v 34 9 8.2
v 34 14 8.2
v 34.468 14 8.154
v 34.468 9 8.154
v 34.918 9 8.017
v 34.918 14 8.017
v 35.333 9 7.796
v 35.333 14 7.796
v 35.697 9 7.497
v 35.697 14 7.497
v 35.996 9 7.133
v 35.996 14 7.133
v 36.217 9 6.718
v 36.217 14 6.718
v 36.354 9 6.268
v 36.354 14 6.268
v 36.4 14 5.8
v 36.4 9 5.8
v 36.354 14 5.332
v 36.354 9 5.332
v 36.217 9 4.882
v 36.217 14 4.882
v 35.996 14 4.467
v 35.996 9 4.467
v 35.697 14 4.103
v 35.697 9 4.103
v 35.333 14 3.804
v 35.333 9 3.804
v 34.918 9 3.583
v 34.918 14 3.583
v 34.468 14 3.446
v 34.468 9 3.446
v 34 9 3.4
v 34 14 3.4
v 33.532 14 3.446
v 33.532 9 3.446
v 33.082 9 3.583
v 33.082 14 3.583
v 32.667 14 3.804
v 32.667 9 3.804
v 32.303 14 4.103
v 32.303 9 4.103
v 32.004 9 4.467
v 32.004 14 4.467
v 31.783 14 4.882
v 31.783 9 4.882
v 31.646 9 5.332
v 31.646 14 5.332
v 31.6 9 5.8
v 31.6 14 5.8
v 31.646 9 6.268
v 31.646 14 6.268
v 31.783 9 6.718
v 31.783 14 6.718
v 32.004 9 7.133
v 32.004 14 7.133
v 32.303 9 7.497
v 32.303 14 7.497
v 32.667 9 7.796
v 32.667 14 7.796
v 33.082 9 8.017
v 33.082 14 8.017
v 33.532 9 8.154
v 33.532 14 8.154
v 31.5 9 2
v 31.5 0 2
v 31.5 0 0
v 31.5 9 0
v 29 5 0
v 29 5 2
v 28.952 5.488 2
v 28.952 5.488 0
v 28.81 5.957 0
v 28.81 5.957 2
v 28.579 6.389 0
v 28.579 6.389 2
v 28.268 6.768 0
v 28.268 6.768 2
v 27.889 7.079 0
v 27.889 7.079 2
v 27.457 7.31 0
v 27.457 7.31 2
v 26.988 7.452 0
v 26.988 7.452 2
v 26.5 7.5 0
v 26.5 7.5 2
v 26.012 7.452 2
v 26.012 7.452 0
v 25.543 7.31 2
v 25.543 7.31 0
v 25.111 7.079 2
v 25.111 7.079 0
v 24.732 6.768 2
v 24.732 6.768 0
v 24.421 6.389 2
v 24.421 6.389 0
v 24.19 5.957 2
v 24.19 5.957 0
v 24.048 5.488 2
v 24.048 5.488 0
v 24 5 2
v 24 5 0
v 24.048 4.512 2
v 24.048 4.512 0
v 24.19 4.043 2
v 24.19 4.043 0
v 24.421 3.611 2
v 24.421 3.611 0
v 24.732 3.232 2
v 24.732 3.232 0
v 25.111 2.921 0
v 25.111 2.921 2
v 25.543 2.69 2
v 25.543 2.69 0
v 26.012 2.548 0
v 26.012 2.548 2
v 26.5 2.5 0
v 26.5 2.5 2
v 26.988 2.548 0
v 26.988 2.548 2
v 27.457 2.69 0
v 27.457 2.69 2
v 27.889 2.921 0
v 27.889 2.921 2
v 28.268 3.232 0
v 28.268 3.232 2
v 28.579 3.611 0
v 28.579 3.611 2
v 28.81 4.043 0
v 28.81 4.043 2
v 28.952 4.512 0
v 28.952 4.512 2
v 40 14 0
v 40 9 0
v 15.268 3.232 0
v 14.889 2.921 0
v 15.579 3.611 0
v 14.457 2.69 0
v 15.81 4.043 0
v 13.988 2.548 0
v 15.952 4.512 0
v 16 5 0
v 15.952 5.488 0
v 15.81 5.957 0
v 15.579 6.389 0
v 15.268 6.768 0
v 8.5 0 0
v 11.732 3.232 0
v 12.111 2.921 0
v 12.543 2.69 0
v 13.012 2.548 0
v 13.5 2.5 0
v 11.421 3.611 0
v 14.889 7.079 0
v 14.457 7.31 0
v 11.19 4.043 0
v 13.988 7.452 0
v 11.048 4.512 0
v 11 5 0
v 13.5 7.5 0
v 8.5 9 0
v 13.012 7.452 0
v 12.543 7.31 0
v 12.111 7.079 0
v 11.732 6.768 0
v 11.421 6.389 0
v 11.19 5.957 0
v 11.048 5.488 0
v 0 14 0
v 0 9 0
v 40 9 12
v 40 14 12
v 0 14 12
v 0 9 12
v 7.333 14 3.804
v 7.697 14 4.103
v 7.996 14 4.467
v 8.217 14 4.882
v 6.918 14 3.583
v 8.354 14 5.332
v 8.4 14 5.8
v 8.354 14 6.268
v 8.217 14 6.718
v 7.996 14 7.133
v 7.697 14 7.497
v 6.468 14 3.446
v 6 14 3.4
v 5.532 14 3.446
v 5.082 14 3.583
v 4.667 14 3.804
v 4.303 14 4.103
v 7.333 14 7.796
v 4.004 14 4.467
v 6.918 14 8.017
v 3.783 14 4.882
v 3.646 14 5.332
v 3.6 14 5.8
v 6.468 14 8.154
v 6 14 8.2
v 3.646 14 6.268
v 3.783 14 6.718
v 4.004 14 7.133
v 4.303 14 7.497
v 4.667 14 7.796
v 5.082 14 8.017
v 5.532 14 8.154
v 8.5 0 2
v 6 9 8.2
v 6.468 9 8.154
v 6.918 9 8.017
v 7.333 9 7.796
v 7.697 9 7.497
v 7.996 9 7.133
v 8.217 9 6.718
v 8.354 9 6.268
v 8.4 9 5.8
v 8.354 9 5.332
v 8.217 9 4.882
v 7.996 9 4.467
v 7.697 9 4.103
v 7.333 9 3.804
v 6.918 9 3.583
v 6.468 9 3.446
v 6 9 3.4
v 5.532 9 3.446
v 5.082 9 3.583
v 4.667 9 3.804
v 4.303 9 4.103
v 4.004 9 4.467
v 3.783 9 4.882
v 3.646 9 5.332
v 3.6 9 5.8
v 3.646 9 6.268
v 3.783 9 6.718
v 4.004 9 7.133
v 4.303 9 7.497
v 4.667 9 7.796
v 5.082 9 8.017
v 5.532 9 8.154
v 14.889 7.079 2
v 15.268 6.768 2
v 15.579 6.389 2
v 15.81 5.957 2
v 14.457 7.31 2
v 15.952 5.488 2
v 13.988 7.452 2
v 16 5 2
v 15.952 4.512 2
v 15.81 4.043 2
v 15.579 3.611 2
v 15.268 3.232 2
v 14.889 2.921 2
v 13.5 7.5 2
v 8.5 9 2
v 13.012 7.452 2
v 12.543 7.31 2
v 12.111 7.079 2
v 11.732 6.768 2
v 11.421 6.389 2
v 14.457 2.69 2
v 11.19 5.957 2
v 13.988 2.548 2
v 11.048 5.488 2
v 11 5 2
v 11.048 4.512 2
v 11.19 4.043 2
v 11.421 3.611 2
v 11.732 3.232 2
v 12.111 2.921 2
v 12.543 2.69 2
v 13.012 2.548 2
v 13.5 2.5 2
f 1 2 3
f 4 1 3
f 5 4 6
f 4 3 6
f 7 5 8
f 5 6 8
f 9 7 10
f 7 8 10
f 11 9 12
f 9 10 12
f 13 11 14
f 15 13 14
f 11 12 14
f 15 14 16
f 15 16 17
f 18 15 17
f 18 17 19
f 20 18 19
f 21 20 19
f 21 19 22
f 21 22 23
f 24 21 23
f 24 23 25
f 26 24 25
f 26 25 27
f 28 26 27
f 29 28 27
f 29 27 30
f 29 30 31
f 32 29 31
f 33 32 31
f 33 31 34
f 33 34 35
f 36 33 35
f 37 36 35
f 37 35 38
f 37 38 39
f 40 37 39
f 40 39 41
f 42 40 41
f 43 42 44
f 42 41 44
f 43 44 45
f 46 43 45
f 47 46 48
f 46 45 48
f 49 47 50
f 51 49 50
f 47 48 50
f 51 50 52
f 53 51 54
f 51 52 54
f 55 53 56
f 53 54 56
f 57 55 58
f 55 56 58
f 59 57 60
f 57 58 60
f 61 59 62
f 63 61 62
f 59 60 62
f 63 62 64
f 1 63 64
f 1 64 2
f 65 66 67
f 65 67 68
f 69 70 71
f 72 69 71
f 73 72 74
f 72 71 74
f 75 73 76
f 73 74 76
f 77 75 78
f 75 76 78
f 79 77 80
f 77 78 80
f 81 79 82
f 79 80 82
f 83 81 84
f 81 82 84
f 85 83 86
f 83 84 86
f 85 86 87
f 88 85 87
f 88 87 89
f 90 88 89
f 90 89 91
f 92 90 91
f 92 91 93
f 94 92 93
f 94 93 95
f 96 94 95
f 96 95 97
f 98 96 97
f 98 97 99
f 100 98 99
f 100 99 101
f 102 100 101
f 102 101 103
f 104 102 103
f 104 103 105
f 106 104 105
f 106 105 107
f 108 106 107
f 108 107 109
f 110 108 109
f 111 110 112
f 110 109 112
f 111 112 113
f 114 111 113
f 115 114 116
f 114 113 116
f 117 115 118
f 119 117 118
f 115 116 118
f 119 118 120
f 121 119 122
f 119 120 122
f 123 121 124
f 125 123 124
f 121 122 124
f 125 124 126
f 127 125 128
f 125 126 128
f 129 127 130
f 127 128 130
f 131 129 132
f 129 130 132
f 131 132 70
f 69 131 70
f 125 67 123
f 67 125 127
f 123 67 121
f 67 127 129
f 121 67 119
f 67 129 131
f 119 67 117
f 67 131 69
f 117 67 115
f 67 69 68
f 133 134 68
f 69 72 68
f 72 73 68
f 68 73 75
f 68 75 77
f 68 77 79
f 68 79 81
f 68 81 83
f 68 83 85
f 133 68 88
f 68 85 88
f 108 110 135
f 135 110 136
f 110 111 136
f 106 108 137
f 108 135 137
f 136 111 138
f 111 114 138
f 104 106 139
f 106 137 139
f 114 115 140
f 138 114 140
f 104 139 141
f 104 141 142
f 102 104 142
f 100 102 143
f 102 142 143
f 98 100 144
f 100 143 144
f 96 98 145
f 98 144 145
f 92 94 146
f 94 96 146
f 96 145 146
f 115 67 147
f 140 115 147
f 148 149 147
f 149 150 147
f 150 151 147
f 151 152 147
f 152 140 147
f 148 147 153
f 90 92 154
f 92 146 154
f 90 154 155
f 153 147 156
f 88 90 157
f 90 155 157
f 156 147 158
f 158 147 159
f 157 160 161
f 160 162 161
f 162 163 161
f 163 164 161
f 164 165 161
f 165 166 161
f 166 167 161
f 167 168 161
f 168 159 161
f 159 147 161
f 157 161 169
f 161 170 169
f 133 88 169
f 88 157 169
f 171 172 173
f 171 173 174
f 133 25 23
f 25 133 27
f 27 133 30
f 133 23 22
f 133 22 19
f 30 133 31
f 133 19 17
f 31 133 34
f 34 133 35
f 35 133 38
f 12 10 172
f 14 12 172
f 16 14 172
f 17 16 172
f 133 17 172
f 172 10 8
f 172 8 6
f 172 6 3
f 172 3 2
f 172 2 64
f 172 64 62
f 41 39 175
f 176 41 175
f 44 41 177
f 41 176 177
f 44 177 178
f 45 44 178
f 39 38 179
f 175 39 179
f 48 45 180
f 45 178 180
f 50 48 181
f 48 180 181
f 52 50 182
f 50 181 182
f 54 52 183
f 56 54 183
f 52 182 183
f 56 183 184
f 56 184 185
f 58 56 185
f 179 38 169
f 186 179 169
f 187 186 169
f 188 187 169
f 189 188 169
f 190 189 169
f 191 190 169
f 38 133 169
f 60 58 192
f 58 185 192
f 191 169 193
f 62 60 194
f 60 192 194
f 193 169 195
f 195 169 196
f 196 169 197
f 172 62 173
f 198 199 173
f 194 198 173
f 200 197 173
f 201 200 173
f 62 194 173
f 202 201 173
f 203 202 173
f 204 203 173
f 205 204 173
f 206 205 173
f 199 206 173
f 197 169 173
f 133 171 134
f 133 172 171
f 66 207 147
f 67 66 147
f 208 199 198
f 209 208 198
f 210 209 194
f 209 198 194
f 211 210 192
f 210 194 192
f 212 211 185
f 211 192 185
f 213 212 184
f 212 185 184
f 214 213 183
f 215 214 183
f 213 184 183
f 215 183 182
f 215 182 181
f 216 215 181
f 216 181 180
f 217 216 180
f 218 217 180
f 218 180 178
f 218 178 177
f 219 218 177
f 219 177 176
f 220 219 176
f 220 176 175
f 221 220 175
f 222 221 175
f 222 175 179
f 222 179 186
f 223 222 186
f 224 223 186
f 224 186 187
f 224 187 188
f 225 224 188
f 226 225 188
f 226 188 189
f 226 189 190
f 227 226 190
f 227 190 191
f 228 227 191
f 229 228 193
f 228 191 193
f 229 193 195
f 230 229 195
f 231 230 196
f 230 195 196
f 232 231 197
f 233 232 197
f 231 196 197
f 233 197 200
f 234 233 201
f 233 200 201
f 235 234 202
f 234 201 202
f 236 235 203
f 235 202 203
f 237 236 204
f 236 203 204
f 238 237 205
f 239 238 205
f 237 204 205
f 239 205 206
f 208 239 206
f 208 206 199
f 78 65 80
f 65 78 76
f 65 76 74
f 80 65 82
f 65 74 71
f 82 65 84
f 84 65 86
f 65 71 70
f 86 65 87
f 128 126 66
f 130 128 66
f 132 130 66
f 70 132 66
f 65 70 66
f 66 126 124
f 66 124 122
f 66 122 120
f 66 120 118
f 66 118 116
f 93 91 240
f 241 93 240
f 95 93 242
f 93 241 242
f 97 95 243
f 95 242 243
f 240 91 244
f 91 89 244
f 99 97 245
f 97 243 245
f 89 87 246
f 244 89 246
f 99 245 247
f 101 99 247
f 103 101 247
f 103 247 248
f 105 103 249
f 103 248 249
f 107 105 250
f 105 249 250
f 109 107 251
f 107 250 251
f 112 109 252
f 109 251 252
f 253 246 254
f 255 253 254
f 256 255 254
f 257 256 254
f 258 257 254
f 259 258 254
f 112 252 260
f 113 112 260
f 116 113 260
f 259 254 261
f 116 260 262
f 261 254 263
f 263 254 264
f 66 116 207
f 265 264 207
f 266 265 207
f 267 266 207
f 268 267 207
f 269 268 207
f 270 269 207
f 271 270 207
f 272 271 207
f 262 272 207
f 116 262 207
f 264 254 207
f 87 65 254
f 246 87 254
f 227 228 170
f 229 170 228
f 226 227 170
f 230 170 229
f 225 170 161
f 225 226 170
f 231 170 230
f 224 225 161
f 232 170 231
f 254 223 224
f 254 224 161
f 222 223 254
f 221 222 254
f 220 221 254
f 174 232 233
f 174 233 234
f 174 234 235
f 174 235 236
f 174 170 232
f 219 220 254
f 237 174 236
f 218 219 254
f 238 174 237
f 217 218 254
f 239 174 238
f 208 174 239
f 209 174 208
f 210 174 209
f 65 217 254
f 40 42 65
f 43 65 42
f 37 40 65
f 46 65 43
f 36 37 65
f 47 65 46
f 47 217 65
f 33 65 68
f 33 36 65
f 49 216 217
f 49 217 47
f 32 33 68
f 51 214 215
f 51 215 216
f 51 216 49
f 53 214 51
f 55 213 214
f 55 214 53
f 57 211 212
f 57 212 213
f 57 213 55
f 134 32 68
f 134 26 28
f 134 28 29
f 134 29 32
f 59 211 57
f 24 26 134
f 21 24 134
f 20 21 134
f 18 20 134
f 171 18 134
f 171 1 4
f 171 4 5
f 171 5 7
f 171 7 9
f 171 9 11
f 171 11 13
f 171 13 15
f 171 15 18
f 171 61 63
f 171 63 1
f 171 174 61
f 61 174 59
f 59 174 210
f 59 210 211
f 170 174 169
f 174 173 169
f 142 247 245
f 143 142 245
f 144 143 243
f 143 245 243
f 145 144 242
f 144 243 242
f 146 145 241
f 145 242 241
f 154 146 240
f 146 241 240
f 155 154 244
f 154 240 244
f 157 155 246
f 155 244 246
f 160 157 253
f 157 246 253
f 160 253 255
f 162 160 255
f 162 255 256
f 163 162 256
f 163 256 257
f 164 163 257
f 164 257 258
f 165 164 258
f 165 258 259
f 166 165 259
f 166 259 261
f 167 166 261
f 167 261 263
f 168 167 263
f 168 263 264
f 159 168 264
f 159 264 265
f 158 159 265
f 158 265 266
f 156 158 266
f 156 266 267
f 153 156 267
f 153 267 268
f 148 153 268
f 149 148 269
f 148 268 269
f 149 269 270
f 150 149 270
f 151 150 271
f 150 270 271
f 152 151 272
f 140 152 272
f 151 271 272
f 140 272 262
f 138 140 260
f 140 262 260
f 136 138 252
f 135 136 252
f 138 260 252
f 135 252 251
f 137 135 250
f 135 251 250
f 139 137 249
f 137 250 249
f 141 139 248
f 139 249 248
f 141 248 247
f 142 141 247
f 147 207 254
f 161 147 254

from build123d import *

# Parameters (mm, degrees)
BOSS_EXTRU_1_DEPTH      = 40
ESQUISSE2_R             = 2.4
ENL_V_MAT_EXTRU_1_DEPTH = 40
ESQUISSE3_W             = 8.5
ESQUISSE3_H             = 9
ENL_V_MAT_EXTRU_2_DEPTH = 40
ESQUISSE4_R             = 2.5
ENL_V_MAT_EXTRU_3_DEPTH = 40


with BuildPart() as part:
    # Esquisse1 → Boss.-Extru.1 (new body)
    with BuildSketch(Plane(origin=(0, 0, 0), x_dir=(0, 0, -1), z_dir=(1, 0, 0))):
        Polygon((0, 0), (0, 14), (-12, 14), (-12, 9), (-2, 9), (-2, 0), align=None)
    extrude(amount=BOSS_EXTRU_1_DEPTH)

    # Esquisse2 → Enlèv. mat.-Extru.1 (cut)
    with BuildSketch(Plane(origin=(0, 14, 0), x_dir=(1, 0, 0), z_dir=(0, 1, 0))):
        with Locations(Location((34, -5.8, 0), (0, 0, 270))):  # turned: the seam where the file's is
            Circle(ESQUISSE2_R)
        with Locations(Location((6, -5.8, 0), (0, 0, 270))):  # turned: the seam where the file's is
            Circle(ESQUISSE2_R)
    extrude(amount=-ENL_V_MAT_EXTRU_1_DEPTH, mode=Mode.SUBTRACT)

    # Esquisse3 → Enlèv. mat.-Extru.2 (cut)
    with BuildSketch(Plane.XY.offset(2)):
        with Locations((4.25, 4.5)):
            Rectangle(ESQUISSE3_W, ESQUISSE3_H)
        with Locations((35.75, 4.5)):
            Rectangle(ESQUISSE3_W, ESQUISSE3_H)
    extrude(amount=-ENL_V_MAT_EXTRU_2_DEPTH, mode=Mode.SUBTRACT)

    # Esquisse4 → Enlèv. mat.-Extru.3 (cut)
    with BuildSketch(Plane.XY.offset(2)):
        with Locations((26.5, 5)):
            Circle(ESQUISSE4_R)
        with Locations((13.5, 5)):
            Circle(ESQUISSE4_R)
    extrude(amount=-ENL_V_MAT_EXTRU_3_DEPTH, mode=Mode.SUBTRACT)


solid = part.part
